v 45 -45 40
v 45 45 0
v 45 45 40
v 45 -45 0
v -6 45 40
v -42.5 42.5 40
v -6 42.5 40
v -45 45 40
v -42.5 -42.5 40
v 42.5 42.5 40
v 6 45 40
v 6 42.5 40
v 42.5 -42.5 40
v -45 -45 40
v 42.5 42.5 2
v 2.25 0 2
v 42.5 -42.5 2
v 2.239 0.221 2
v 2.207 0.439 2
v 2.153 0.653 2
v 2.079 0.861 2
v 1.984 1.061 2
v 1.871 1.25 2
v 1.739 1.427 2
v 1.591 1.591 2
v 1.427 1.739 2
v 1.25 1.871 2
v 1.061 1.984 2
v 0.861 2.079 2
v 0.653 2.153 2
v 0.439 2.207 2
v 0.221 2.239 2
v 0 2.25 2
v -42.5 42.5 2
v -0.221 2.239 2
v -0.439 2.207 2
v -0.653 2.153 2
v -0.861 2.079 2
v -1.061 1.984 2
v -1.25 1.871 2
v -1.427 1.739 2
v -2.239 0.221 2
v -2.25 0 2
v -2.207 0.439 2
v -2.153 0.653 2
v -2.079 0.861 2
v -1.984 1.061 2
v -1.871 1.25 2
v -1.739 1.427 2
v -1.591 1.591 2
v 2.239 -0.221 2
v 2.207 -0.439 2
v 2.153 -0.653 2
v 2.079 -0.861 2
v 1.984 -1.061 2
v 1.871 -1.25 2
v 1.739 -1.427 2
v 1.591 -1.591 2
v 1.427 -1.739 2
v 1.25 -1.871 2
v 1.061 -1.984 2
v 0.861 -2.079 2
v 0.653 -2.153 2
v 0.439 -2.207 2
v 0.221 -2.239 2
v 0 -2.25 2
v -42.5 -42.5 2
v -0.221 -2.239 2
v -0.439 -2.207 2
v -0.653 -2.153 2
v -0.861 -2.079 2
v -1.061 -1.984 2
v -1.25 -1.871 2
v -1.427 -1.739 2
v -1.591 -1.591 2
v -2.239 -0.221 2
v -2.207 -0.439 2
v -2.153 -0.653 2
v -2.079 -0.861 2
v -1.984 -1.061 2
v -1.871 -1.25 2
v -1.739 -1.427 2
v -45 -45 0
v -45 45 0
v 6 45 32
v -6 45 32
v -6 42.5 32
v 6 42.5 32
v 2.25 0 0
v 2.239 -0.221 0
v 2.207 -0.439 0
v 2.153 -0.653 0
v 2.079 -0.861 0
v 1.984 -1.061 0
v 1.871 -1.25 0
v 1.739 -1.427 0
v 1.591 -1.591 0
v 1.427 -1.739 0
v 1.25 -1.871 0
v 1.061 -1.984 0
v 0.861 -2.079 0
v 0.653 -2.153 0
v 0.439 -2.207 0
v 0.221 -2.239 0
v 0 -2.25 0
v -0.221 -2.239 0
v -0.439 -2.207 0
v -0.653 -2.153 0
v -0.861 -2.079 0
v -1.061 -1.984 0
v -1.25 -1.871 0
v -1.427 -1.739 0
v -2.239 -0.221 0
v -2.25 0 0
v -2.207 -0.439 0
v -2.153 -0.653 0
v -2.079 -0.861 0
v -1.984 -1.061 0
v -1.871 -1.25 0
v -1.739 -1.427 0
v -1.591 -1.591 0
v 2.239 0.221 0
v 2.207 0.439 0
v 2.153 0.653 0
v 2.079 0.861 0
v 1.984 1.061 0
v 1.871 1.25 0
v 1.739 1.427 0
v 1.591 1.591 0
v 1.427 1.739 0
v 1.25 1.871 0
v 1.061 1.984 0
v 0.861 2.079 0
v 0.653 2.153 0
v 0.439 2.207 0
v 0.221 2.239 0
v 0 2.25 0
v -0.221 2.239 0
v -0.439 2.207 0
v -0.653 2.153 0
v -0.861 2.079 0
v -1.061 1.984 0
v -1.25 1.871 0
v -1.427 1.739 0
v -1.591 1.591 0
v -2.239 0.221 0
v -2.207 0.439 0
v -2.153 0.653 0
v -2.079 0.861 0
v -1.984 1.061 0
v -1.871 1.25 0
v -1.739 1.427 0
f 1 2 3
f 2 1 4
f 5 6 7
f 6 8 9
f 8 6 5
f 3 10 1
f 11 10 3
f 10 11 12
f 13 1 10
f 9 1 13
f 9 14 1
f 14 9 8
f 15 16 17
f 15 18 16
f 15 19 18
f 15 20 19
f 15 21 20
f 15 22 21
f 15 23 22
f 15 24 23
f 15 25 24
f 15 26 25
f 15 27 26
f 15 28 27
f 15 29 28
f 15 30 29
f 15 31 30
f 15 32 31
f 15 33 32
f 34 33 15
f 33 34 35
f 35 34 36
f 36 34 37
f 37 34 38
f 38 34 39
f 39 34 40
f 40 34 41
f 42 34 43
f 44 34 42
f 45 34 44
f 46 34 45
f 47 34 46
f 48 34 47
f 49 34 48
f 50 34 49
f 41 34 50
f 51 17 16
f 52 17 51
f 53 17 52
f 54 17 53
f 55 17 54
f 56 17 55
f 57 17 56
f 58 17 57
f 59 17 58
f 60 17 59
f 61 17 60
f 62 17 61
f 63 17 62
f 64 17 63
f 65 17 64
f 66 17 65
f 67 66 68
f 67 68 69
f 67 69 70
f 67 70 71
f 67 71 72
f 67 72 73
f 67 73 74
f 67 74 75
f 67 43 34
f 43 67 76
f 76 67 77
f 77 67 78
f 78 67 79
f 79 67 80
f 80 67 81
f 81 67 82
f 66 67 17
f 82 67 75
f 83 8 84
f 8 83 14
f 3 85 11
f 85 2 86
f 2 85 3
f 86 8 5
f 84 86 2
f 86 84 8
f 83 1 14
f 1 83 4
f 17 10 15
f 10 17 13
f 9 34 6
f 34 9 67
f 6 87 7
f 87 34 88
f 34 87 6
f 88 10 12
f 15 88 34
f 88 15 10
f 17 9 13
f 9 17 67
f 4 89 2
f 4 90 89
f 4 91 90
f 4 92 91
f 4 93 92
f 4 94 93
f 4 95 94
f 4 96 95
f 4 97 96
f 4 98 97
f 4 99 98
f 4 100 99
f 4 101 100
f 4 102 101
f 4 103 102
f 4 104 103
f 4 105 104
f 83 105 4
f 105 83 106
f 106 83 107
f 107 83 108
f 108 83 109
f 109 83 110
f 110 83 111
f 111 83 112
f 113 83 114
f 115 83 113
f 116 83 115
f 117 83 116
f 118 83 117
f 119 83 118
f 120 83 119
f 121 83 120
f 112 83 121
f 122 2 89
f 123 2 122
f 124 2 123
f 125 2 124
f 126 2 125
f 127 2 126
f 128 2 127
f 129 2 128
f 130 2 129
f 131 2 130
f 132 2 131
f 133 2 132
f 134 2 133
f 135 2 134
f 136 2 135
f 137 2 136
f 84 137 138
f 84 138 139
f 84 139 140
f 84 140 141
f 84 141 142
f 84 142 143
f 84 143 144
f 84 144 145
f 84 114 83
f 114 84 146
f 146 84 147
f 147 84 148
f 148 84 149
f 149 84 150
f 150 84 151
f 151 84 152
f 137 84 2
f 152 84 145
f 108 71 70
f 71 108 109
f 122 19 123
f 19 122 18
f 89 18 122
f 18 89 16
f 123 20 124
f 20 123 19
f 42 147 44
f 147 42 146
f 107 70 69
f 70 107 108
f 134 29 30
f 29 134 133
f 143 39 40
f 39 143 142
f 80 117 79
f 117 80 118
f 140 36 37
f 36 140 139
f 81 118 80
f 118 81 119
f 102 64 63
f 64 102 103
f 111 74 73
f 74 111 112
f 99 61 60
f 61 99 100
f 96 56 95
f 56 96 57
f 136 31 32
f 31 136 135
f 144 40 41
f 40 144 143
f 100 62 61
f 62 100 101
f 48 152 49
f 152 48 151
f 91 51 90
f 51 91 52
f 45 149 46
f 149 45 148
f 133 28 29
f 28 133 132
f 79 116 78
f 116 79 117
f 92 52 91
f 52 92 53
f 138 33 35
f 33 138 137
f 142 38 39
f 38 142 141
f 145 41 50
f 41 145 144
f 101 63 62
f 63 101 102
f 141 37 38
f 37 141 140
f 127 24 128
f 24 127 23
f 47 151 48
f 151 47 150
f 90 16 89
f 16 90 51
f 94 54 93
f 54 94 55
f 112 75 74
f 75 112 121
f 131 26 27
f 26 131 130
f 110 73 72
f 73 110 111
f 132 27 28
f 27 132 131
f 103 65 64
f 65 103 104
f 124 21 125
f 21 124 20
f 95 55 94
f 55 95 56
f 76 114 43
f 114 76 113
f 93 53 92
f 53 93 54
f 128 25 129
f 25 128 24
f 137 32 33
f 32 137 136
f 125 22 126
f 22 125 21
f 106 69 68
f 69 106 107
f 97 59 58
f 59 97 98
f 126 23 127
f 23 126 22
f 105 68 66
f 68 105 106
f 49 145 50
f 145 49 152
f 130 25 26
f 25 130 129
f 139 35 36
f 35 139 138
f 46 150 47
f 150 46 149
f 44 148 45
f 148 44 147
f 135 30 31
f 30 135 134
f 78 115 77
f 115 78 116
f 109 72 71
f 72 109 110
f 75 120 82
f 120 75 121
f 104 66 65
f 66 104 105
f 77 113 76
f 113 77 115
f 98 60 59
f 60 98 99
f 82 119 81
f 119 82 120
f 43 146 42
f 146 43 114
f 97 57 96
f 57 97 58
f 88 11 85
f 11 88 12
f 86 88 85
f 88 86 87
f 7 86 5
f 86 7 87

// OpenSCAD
// --- Dimensions (mm) ---
outer_width = 90;          // Outer width and length of the box
outer_length = 90;         // Outer length and width of the box
wall_thickness = 2.5;       // Thickness of the four vertical walls
top_plate_thickness = 2;    // Thickness of the top plate (the stirring surface)
total_height = 40;         // Total height of the housing
screw_hole_diameter = 4.5;  // Diameter for M4 screw holes
screw_pattern_size = 71.5;  // Distance between screw holes (square pattern)
notch_width = 12;          // Width of the cable notch
notch_height = 8;          // Height of the notch (from z=32 to z=40)

// --- Constants ---
$fn = 64;

// --- Implementation ---

// The part is modeled upside down: 
// The top plate (stirring surface) is at Z = 0 to Z = 2.
// The walls rise from Z = 2 to Z = 40.

module housing() {
    // We center the object on the XY plane as per instructions
    translate([-outer_width/2, -outer_length/2, 0])
    difference() {
        // Main Body
        union() {
            // The Top Plate (Base of the box in this orientation)
            cube([outer_width, outer_length, top_plate_thickness]);
            
            // The Four Walls
            // We use a single cube and subtract the interior to ensure 
            // the walls are exactly the specified thickness.
            translate([0, 0, top_plate_thickness])
            difference() {
                // Outer boundary of the walls
                cube([outer_width, outer_length, total_height - top_plate_thickness]);
                
                // Hollow out the inside
                // To ensure walls are exactly 2.5mm, we subtract a cube 
                // that is (outer - 2*wall_thickness)
                translate([wall_thickness, wall_thickness, -0.01])
                cube([outer_width - 2*wall_thickness, outer_length - 2*wall_thickness, total_height]);
            }
        }

        // 1. Screw Holes (through the top plate)
        // Centered on the plate. Pattern is 71.5mm.
        // Coordinates relative to the [-45, -45] origin:
        // Center is at 45, 45. 
        // Hole 1: 45 - 35.75 = 9.25
        // Hole 2: 45 + 35.75 = 80.75
        // Using relative offsets from the corner:
        for (i = [-1, 1], j = [-1, 1]) {
            translate([
                outer_width/2 + i * screw_pattern_size/2 - screw_pattern_size/2, 
                outer_length/2 + j * screw_pattern_size/2 - screw_pattern_size/2, 
                -0.01
            ])
            cylinder(d = screw_hole_diameter, h = top_plate_thickness + 0.02);
        }

        // 2. Cable Notch
        // Located in one wall, centered along the wall, reaching 8mm down from the open edge.
        // Open edge is at Z = 40. Notch is from Z = 32 to Z = 40.
        // We place it on the wall at Y = outer_length.
        // To ensure it cuts through the wall, we translate it slightly outside the wall.
        translate([
            outer_width/2 - notch_width/2, 
            outer_length - wall_thickness - 0.1, 
            total_height - notch_height
        ])
        cube([notch_width, wall_thickness + 0.2, notch_height + 0.1]);
    }
}

// Render the part
housing();
